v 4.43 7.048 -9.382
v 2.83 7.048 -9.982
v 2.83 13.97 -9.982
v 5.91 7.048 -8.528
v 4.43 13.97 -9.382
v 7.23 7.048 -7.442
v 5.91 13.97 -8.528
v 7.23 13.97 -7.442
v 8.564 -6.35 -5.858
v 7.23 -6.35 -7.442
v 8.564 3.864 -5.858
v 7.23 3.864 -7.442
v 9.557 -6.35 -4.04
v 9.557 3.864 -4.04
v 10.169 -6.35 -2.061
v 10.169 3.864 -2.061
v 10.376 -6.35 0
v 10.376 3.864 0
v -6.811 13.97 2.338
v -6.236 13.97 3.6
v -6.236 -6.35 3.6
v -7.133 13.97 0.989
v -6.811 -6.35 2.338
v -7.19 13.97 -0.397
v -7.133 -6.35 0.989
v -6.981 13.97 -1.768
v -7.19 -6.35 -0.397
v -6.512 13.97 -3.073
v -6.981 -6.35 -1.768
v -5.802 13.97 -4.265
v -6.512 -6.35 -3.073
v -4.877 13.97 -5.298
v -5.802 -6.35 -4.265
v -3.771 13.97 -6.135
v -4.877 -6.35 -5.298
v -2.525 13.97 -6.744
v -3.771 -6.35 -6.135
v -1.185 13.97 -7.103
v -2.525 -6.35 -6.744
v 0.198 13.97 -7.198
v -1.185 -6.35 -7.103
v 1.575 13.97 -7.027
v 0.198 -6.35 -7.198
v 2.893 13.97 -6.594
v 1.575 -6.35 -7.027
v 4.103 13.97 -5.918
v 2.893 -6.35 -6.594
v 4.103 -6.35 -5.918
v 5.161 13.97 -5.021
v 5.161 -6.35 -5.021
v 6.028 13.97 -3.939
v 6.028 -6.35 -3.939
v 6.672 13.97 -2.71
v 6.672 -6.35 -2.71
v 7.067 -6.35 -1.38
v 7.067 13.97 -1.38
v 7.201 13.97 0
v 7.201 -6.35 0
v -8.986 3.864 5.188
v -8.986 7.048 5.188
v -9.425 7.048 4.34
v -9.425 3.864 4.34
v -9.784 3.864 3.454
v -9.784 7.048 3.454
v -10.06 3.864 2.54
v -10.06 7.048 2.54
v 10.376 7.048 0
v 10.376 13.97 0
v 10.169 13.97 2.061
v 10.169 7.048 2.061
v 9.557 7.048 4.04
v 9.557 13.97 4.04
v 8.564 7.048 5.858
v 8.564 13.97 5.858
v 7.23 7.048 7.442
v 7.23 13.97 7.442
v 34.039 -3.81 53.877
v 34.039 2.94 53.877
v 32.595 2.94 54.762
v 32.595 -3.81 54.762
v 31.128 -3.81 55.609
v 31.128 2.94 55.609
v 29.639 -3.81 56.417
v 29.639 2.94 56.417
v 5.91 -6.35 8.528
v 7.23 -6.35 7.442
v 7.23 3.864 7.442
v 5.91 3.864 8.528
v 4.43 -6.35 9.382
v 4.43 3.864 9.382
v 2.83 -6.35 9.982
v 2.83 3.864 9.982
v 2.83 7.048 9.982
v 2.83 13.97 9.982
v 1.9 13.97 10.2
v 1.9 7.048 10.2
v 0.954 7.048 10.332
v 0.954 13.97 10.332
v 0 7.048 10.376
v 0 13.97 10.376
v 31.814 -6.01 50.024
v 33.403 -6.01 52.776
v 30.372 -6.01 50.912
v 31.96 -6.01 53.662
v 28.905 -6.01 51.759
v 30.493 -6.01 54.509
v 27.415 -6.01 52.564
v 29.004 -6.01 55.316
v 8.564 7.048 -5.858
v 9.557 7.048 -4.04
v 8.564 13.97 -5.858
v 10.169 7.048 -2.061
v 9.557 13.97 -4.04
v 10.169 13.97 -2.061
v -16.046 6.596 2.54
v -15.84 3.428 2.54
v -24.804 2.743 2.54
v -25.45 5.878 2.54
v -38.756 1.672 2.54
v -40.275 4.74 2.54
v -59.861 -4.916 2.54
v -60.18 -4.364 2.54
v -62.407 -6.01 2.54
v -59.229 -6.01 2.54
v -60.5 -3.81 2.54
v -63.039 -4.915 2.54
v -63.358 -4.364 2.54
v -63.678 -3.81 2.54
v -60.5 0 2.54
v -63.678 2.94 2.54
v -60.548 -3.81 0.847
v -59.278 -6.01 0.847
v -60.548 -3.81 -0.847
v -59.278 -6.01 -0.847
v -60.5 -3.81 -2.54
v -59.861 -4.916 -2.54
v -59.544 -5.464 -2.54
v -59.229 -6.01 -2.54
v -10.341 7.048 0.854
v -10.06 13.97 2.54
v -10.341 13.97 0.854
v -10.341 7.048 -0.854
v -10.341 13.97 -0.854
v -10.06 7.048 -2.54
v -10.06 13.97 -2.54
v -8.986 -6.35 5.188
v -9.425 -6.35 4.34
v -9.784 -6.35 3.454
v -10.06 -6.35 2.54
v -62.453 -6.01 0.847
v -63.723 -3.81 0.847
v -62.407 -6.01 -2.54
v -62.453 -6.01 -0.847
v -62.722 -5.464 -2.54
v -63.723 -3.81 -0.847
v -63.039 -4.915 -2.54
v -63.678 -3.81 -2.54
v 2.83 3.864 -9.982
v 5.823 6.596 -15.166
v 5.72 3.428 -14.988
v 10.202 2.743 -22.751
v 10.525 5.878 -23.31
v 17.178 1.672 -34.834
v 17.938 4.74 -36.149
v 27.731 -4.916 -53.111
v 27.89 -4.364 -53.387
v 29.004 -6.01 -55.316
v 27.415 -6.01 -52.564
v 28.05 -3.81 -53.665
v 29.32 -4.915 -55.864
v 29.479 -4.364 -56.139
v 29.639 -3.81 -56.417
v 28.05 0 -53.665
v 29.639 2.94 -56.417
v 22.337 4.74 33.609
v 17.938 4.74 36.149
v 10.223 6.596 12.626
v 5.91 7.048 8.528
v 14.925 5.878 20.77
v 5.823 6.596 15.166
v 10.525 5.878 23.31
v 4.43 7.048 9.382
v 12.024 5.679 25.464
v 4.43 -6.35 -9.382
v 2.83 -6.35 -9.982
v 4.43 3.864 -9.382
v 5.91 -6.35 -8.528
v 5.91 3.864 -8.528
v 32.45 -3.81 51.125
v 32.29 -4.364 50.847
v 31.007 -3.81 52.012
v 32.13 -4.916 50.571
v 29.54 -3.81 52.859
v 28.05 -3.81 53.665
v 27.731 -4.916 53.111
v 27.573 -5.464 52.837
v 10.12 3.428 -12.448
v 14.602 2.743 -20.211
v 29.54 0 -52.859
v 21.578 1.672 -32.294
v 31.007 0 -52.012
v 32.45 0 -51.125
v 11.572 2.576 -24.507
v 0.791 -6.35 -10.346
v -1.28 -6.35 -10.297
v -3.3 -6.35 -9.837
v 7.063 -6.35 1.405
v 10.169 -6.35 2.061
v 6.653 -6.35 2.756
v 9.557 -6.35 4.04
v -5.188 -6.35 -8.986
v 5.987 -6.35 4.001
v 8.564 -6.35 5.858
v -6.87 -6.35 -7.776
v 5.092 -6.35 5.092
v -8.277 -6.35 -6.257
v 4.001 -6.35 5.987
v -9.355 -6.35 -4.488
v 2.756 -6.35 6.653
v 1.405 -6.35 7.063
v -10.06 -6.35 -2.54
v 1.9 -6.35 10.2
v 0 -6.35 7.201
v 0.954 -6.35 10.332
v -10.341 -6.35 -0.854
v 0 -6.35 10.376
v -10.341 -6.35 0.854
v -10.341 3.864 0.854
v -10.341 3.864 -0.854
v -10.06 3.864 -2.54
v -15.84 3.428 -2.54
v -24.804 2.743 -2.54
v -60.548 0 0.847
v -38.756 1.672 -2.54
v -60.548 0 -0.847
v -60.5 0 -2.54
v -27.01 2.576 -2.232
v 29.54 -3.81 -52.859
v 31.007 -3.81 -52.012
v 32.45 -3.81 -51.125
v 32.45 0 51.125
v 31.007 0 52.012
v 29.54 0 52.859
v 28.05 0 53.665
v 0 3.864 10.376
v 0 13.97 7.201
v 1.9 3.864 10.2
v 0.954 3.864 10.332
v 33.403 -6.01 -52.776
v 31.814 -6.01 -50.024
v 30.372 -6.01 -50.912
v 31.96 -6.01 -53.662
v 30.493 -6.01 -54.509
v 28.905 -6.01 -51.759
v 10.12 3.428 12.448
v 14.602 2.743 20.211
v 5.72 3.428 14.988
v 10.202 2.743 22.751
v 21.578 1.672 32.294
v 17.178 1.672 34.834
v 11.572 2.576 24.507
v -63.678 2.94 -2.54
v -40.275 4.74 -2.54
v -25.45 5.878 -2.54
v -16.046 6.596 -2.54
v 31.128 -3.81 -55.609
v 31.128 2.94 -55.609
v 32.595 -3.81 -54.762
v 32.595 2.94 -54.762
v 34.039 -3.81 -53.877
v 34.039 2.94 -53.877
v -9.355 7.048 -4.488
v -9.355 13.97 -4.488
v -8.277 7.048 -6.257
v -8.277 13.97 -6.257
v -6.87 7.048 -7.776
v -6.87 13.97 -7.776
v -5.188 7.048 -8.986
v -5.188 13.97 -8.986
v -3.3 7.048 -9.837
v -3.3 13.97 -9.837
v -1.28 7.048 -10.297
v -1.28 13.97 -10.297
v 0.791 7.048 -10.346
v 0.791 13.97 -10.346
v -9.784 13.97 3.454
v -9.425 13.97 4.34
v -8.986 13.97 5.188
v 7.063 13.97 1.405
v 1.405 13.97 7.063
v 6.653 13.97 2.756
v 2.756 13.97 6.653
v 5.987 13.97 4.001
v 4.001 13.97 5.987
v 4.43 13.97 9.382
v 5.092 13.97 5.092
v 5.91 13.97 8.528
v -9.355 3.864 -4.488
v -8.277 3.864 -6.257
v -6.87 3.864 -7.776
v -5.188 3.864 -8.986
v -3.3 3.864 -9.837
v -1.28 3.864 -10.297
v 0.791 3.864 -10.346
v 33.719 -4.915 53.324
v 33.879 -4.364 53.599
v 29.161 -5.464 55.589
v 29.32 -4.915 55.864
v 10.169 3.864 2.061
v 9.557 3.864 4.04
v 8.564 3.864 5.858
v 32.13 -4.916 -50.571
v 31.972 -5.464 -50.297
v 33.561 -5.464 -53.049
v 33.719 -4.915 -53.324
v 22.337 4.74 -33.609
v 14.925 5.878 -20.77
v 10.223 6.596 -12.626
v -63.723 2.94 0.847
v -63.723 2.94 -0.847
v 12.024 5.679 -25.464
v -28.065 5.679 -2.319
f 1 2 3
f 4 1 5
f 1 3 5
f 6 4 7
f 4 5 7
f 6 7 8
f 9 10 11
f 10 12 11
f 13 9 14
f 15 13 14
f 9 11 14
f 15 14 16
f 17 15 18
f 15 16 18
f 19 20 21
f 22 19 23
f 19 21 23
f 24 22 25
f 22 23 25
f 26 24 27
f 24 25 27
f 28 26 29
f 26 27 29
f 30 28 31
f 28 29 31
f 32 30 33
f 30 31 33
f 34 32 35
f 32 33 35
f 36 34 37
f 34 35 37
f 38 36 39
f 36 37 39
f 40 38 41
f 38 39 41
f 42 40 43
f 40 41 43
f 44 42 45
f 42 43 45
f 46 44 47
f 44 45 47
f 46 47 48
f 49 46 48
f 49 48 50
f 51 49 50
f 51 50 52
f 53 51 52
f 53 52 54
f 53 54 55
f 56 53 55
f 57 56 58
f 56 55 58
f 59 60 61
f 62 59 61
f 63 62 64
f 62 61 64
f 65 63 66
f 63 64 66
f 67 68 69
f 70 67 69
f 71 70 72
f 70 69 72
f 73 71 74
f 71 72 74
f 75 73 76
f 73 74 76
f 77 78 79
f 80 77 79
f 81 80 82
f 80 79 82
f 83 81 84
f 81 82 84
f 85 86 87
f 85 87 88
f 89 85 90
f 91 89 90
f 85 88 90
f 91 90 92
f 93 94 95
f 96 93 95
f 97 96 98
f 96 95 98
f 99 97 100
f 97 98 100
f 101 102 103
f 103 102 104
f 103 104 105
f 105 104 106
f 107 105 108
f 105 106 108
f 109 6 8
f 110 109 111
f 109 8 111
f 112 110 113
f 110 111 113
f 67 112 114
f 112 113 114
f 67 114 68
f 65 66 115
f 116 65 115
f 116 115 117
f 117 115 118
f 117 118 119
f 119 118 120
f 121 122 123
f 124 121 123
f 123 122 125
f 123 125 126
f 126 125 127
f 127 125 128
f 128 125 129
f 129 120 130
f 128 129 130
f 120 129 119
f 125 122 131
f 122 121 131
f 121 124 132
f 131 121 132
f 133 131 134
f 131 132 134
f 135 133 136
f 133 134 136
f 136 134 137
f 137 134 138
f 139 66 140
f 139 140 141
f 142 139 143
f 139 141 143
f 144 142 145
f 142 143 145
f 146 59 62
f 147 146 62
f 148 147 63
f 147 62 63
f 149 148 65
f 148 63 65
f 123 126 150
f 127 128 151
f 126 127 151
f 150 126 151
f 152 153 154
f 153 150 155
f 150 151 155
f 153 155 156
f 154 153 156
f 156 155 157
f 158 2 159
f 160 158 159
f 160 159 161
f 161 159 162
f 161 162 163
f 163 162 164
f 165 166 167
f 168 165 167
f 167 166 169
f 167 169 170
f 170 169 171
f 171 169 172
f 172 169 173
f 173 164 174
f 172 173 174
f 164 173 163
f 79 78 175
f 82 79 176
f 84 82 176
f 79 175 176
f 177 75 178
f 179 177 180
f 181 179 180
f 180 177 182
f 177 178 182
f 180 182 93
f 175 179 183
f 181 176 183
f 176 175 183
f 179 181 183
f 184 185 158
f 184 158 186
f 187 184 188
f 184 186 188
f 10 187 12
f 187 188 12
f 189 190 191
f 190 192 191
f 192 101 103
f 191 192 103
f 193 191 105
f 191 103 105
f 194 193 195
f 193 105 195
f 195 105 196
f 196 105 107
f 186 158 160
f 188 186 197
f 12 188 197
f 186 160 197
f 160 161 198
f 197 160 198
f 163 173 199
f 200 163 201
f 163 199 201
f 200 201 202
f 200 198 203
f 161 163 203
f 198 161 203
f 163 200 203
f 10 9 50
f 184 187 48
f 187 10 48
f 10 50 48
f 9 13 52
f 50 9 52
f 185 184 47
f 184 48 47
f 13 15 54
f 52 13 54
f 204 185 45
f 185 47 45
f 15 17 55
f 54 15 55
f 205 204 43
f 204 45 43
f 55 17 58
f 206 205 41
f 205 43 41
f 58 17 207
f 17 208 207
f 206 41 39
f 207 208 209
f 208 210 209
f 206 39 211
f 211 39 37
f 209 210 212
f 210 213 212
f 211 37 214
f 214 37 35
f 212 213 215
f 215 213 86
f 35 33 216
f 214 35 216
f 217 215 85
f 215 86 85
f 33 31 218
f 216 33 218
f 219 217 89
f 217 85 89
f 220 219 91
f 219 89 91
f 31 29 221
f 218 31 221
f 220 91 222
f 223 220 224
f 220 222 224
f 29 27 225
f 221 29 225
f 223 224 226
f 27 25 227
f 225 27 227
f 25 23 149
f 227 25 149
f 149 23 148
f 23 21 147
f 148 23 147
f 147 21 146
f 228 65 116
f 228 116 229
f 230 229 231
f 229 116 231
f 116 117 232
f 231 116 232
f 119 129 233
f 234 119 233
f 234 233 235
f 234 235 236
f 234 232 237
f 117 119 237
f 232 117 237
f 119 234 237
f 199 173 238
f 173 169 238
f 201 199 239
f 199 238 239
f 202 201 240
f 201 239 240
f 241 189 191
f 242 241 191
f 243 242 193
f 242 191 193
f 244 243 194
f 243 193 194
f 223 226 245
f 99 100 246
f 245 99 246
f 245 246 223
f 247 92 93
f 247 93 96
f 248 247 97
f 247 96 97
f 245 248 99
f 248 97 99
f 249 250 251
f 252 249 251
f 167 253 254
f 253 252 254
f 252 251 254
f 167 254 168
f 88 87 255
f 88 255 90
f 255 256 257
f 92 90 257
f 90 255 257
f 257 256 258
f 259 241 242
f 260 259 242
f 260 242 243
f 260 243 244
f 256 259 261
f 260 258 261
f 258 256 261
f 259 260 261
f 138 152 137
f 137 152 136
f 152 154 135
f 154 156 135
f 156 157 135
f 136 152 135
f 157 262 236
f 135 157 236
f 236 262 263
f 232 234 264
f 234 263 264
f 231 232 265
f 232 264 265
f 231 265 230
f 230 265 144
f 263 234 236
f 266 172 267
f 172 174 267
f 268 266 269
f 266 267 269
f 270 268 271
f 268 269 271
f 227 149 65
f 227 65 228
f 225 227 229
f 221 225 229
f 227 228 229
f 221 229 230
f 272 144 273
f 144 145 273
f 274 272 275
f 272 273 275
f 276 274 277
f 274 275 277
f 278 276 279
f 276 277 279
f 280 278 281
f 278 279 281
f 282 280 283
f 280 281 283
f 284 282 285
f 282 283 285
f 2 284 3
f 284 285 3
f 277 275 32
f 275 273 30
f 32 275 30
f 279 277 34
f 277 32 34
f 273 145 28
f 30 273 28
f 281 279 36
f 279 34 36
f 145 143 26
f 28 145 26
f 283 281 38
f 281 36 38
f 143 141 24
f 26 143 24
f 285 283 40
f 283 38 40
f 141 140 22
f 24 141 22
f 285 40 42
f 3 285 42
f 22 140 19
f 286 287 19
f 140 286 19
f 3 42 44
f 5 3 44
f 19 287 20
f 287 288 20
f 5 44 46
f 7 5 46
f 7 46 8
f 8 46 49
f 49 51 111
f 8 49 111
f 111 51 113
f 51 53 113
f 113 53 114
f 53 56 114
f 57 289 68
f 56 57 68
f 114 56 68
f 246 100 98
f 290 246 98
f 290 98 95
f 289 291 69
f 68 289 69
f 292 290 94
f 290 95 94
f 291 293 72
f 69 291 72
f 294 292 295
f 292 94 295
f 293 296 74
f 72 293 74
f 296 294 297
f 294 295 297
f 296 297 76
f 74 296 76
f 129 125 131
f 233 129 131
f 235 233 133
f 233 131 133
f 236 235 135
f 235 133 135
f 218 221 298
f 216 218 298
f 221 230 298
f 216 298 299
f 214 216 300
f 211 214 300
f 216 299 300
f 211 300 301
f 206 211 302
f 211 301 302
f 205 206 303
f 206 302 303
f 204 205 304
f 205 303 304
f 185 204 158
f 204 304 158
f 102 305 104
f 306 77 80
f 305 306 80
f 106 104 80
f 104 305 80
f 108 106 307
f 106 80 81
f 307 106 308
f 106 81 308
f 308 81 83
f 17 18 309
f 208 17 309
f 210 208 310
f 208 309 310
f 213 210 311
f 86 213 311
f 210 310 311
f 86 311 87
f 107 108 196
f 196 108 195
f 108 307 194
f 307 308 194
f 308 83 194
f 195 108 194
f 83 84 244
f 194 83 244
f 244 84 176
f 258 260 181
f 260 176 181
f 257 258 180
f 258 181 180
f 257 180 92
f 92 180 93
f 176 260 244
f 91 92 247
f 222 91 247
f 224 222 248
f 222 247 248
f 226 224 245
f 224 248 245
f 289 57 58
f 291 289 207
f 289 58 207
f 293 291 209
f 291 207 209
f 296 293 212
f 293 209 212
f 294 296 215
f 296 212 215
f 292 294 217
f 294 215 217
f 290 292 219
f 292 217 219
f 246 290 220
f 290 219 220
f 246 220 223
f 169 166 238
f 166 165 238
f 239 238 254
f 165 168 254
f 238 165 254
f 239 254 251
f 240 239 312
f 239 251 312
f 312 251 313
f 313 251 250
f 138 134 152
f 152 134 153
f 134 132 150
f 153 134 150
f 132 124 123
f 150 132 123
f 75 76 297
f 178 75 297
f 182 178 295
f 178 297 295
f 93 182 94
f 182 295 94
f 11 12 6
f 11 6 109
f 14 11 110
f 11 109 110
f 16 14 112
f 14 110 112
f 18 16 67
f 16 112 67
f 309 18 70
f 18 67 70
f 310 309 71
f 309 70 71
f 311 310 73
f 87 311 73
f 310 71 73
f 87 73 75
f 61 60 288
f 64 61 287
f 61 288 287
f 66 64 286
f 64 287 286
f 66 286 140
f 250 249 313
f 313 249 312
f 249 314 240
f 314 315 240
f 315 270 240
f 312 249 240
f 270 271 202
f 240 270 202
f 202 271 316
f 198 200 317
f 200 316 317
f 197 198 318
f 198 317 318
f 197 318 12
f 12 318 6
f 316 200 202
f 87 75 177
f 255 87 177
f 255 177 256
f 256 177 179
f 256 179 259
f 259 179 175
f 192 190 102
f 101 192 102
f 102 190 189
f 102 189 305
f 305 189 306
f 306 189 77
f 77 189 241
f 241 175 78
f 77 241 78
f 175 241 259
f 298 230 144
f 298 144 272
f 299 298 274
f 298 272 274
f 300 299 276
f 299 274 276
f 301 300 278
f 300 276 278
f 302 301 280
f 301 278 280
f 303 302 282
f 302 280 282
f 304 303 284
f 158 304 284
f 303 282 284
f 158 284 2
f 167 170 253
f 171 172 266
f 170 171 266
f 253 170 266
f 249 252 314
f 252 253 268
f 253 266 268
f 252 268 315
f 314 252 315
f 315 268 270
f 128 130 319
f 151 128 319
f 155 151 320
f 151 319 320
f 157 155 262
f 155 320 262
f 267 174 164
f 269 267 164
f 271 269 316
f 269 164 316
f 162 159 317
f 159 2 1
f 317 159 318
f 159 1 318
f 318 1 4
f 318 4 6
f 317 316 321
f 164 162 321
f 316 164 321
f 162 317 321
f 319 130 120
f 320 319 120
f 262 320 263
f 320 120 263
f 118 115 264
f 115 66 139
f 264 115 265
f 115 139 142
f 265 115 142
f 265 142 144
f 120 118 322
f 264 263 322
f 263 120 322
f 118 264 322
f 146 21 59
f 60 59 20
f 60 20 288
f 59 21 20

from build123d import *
from build123d import SkipClean  # not in build123d's __all__

# Parameters (mm, degrees)
F3_DEPTH = 25.4


with BuildPart() as f1:
    # F0 (on Top) → F1 (revolve)
    with BuildSketch(Plane.XY):
        Polygon((63.7286, -3.81), (63.7286, 2.9399013527), (10.3759, 7.0484601322), (10.3759, 13.97), (7.2009, 13.97), (7.2009, -6.35), (10.3759, -6.35), (10.3759, 3.8640599232), (60.5536, 0), (60.5536, -3.81), (59.2836, -6.0097045256), (62.4586, -6.0097045256), align=None)
    revolve(axis=Axis((0, -13.2026916835, 0), (0, -1, 0)))

    # F2 (on face) → F3 (cut)
    with BuildSketch(Plane(origin=(0, 13.97, 0), x_dir=(-1, 0, 0), z_dir=(0, 1, 0))):
        with BuildLine():
            Line((111.0251099892, -2.54), (10.0602038155, -2.54))
            ThreePointArc((10.0602038155, -2.54), (5.18795, -8.9857929871), (-2.8303973822, -9.9823920715))
            Line((-2.8303973822, -9.9823920715), (-53.312850469, -97.4205657086))
            ThreePointArc((-53.312850469, -97.4205657086), (40.7588842751, -70.5964584242), (111.0251099892, -2.54))
        make_face()
        with BuildLine():
            Line((10.0602038155, 2.54), (111.0251099892, 2.54))
            ThreePointArc((111.0251099892, 2.54), (40.7588842751, 70.5964584242), (-53.312850469, 97.4205657086))
            Line((-53.312850469, 97.4205657086), (-2.8303973822, 9.9823920715))
            ThreePointArc((-2.8303973822, 9.9823920715), (-1.4288105045, 10.2770521723), (0, 10.3759))
            Line((0, 10.3759), (0, 0))
            Line((0, 0), (8.9857929871, 5.18795))
            ThreePointArc((8.9857929871, 5.18795), (9.6145935095, 3.9011398921), (10.0602038155, 2.54))
        make_face()
        with BuildLine():
            Line((-7.2298064334, 7.4423920715), (-57.7122595202, 94.8805657086))
            ThreePointArc((-57.7122595202, 94.8805657086), (-81.5177685501, 0), (-57.7122595202, -94.8805657086))
            Line((-57.7122595202, -94.8805657086), (-7.2298064334, -7.4423920715))
            ThreePointArc((-7.2298064334, -7.4423920715), (-10.3759, 0), (-7.2298064334, 7.4423920715))
        make_face()
    with SkipClean():  # cleaning this boolean's faces spoils the solid; the shape is the same uncleaned
        extrude(amount=-F3_DEPTH, mode=Mode.SUBTRACT)


solid = f1.part
